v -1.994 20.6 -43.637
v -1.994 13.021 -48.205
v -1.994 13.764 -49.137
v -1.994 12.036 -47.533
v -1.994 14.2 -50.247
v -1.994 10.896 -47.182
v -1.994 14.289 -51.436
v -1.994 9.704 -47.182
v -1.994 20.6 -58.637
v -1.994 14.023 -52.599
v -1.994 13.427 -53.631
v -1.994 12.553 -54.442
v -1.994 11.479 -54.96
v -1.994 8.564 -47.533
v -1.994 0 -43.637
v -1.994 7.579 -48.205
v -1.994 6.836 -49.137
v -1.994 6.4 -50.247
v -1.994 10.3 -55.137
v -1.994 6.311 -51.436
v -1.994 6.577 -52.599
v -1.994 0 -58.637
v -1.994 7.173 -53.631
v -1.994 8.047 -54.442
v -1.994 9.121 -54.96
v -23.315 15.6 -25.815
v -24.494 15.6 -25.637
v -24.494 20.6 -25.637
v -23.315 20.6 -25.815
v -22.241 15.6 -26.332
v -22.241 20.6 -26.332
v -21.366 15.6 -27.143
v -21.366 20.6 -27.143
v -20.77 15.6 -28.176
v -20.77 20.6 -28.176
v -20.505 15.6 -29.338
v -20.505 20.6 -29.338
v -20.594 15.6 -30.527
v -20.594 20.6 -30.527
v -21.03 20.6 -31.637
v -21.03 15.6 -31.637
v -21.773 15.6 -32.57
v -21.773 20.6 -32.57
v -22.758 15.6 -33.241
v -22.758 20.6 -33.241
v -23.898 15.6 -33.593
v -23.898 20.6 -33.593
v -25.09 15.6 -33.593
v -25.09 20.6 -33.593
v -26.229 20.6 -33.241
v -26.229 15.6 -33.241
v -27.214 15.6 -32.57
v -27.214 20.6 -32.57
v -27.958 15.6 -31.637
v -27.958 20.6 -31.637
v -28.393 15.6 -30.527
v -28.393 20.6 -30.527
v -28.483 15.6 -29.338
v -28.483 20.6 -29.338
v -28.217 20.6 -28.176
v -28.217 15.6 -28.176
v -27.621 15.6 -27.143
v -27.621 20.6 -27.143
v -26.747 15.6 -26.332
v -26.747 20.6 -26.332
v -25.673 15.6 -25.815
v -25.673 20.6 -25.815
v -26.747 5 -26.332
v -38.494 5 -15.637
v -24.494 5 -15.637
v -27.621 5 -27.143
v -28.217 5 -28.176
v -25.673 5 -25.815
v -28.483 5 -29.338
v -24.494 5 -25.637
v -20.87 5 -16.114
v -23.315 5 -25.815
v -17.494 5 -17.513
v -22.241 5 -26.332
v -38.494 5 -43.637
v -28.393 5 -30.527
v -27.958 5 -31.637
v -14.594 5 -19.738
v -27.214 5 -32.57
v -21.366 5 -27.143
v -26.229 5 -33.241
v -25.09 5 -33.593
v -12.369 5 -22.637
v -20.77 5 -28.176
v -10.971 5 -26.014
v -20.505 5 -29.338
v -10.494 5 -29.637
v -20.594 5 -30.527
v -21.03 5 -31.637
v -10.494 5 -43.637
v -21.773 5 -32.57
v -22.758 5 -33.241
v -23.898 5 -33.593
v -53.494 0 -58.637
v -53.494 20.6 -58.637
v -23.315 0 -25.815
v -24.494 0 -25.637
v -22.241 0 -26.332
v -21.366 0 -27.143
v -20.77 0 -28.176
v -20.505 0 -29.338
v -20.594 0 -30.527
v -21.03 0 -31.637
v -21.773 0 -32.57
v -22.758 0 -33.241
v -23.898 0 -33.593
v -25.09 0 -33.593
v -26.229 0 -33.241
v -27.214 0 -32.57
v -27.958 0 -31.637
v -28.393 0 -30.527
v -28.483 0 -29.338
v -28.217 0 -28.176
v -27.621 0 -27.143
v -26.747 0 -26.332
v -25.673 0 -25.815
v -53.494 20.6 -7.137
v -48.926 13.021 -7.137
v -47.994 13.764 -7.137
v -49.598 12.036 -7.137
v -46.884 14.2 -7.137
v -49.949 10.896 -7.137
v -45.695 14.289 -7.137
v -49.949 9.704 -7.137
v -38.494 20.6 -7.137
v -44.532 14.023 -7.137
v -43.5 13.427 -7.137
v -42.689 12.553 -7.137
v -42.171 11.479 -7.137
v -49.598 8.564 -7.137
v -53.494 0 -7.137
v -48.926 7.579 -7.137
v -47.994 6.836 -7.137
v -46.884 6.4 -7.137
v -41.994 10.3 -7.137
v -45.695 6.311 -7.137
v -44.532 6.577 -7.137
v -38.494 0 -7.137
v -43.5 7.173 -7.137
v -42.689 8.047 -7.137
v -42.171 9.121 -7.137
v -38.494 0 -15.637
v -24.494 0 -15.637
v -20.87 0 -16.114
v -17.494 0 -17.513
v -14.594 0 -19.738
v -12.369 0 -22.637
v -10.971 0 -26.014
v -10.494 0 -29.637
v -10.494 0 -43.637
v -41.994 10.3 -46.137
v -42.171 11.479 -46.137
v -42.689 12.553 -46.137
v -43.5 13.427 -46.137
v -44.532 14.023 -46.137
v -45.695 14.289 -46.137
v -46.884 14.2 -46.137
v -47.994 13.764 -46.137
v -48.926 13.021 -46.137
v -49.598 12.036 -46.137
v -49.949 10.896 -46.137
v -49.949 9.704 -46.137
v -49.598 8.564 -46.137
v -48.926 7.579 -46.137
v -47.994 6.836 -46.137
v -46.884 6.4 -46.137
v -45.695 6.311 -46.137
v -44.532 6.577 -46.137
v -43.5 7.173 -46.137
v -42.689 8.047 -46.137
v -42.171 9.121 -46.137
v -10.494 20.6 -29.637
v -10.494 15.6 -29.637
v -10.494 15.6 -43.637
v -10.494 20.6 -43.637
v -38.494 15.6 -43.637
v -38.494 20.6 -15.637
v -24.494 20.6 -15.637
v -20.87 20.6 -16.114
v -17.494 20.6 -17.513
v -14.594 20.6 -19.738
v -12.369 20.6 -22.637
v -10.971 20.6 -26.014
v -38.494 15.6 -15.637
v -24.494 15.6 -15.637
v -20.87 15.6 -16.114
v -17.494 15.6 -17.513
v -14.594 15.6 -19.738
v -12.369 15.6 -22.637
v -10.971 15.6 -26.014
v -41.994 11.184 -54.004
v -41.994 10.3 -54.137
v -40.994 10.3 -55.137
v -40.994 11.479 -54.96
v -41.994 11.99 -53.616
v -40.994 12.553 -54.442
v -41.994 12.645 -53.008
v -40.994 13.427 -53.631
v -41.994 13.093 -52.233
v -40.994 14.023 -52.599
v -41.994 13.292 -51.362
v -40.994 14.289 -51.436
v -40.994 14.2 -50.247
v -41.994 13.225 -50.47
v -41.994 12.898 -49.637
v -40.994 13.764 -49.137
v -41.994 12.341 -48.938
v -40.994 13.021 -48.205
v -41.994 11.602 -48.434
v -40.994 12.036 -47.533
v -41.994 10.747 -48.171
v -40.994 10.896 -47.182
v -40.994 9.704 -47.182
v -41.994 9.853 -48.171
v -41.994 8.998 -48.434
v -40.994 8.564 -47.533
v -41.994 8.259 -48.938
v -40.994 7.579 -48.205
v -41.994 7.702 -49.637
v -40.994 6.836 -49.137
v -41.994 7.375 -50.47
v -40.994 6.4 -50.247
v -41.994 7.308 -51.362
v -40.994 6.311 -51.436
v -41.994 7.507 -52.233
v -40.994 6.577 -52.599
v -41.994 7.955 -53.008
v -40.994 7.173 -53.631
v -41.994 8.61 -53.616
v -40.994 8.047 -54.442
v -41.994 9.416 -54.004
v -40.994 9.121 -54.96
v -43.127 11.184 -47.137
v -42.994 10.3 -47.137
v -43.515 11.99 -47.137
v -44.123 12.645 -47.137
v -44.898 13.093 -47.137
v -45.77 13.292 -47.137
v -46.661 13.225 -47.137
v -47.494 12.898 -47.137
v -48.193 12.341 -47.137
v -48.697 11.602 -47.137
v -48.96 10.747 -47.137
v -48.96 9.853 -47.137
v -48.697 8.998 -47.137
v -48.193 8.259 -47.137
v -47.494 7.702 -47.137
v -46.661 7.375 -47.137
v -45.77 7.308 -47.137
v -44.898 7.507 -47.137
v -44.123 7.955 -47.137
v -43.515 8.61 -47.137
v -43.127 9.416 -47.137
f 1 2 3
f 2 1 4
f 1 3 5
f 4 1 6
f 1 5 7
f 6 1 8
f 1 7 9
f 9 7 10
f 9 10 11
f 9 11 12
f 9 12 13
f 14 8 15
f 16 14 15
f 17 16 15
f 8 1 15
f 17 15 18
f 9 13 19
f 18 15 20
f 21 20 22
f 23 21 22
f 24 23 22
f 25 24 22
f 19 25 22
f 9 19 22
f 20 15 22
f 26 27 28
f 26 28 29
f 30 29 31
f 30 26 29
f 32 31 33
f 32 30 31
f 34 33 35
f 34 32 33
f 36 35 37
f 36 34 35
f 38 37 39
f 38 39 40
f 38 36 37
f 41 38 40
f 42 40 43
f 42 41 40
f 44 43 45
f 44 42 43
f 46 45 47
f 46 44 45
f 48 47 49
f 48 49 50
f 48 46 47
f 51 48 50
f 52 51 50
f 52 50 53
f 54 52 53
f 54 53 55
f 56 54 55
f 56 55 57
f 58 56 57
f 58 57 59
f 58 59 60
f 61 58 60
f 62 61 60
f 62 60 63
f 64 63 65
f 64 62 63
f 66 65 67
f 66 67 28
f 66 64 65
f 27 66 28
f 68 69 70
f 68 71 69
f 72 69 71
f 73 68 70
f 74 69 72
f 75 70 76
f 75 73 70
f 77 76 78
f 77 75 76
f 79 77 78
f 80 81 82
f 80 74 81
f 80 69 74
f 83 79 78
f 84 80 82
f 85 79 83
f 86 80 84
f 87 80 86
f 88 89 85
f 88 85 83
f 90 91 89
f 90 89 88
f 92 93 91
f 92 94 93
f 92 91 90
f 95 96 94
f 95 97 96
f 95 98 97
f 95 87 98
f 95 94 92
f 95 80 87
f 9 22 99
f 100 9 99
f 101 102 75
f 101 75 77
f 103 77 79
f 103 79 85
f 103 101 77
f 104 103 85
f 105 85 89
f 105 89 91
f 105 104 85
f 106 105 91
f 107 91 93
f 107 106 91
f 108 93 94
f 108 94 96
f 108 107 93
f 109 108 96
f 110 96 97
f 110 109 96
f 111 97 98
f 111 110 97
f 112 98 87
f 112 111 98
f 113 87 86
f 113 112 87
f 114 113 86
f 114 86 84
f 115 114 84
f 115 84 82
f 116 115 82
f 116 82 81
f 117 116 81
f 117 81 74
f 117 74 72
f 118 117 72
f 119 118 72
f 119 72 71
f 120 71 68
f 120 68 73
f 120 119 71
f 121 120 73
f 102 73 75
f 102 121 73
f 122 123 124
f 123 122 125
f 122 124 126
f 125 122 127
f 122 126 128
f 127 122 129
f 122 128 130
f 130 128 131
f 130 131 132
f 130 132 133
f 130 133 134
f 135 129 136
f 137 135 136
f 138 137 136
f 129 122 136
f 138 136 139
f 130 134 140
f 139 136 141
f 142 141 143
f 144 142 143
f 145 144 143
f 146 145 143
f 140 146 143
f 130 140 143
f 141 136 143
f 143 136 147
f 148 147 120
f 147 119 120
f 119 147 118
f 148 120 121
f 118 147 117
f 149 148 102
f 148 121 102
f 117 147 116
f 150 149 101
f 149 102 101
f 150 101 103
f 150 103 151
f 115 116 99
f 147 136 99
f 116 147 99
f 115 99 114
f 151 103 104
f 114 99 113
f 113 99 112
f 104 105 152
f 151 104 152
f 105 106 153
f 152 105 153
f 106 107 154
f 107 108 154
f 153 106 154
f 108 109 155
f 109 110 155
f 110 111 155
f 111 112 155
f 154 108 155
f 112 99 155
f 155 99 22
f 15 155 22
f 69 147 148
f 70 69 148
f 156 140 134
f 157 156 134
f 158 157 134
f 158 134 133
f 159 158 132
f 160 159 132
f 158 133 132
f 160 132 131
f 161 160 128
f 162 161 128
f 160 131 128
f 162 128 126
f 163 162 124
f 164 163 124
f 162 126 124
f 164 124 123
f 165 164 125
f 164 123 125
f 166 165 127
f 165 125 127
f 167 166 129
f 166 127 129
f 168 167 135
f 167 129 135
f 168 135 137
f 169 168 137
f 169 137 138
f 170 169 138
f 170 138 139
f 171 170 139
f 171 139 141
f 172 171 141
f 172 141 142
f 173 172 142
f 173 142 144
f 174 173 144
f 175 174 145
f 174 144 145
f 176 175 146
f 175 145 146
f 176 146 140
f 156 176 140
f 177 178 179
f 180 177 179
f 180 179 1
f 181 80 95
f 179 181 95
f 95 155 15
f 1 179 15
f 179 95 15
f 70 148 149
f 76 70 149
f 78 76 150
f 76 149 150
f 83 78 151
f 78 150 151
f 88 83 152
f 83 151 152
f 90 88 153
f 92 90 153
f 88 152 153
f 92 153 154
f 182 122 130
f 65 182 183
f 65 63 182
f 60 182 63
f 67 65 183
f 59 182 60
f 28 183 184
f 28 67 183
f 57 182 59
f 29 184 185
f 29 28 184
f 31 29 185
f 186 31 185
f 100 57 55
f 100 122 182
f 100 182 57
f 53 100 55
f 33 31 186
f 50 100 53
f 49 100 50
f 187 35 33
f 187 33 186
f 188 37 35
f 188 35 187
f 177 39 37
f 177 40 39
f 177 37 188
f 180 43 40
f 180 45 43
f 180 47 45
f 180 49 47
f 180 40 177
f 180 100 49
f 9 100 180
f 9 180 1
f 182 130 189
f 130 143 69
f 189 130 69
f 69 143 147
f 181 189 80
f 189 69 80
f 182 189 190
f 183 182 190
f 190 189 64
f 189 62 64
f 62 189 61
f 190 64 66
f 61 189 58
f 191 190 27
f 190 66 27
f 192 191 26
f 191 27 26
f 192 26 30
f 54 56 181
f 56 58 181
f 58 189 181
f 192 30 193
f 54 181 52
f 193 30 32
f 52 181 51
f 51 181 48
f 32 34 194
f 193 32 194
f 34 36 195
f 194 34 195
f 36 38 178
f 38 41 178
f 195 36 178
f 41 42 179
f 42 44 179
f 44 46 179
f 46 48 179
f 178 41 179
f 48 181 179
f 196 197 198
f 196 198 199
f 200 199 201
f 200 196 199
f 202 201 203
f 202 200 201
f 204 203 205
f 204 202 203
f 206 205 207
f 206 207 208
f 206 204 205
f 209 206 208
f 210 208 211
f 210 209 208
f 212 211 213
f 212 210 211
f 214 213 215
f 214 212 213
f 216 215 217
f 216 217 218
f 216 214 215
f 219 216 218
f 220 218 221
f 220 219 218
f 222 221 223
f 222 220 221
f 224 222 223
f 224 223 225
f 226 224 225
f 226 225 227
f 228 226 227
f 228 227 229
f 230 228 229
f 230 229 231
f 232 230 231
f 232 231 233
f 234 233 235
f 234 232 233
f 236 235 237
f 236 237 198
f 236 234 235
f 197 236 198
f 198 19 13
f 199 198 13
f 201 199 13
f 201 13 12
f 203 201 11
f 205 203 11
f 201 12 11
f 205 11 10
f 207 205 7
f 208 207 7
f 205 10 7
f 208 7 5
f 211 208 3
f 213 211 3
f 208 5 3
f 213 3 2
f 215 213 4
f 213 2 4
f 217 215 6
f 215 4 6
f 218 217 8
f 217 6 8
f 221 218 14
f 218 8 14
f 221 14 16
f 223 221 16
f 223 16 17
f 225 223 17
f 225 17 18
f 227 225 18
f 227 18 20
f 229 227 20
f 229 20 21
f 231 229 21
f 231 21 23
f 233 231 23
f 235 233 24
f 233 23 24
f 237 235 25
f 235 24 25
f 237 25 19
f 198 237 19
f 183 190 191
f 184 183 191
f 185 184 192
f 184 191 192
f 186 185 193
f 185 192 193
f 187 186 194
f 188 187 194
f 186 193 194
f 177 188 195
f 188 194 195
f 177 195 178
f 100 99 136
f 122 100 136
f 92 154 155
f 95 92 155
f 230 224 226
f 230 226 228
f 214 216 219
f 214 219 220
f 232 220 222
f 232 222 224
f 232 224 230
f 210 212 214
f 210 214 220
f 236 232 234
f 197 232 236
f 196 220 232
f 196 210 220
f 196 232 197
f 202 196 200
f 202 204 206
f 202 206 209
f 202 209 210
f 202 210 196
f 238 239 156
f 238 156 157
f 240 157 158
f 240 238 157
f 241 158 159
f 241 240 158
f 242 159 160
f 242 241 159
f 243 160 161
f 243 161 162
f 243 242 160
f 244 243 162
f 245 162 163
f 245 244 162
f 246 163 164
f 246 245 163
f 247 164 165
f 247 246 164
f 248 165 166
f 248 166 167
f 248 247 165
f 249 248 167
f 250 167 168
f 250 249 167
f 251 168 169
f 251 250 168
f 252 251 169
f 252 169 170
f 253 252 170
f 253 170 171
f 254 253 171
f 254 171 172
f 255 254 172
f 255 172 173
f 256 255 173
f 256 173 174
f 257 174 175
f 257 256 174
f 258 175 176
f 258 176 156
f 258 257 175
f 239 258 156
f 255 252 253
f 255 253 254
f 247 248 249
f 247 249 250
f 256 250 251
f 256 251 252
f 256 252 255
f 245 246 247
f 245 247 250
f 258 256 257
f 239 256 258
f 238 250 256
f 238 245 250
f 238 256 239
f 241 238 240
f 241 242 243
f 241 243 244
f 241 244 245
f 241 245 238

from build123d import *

# Parameters (mm, degrees)
SKETCH1_W           = 8
SKETCH1_H           = 40
SKETCH1_W_2         = 40
SKETCH1_H_2         = 8
BOSS_EXTRUDE1_DEPTH = 20.6
SKETCH1_3_R         = 4
BOSS_EXTRUDE2_DEPTH = 5
BOSS_EXTRUDE4_START = 15.6
SKETCH1_4_R         = 4
BOSS_EXTRUDE4_DEPTH = 5
SKETCH2_R           = 4
CUT_EXTRUDE1_DEPTH  = 40
CHAMFER1_SIZE       = 1
SKETCH5_R           = 4
CUT_EXTRUDE7_DEPTH  = 40
CHAMFER2_SIZE       = 1


with BuildPart() as part:
    # Sketch1 → Boss-Extrude1 (new body)
    with BuildSketch(Plane(origin=(0, 0, 0), x_dir=(1, 0, 0), z_dir=(0, 1, 0))):
        Polygon((-49.993785762, 7.13734227), (-49.993785762, 47.13734227), (-41.993785762, 47.13734227), (-41.993785762, 55.13734227), (-1.993785762, 55.13734227), (-1.993785762, 58.63734227), (-53.493785762, 58.63734227), (-53.493785762, 7.13734227), align=None)
        with Locations((-45.993785762, 27.13734227)):
            Rectangle(SKETCH1_W, SKETCH1_H)
        Polygon((-1.993785762, 47.13734227), (-41.993785762, 47.13734227), (-41.993785762, 7.13734227), (-38.493785762, 7.13734227), (-38.493785762, 15.63734227), (-38.493785762, 43.63734227), (-10.493785762, 43.63734227), (-1.993785762, 43.63734227), align=None)
        with Locations((-21.993785762, 51.13734227)):
            Rectangle(SKETCH1_W_2, SKETCH1_H_2)
    extrude(amount=BOSS_EXTRUDE1_DEPTH)

    # Sketch1<3> → Boss-Extrude2 (add)
    with BuildSketch(Plane(origin=(0, 0, 0), x_dir=(1, 0, 0), z_dir=(0, 1, 0))):
        with BuildLine():
            Line((-38.493785762, 43.63734227), (-38.493785762, 15.63734227))
            Line((-38.493785762, 15.63734227), (-24.493785762, 15.63734227))
            ThreePointArc((-24.493785762, 15.63734227), (-14.594290825, 19.737847333), (-10.493785762, 29.63734227))
            Line((-10.493785762, 29.63734227), (-10.493785762, 43.63734227))
            Line((-10.493785762, 43.63734227), (-38.493785762, 43.63734227))
        make_face()
        with Locations(Location((-24.493785762, 29.63734227, 0), (0, 0, 270))):
            Circle(SKETCH1_3_R, mode=Mode.SUBTRACT)
    extrude(amount=BOSS_EXTRUDE2_DEPTH)

    # Sketch1<4> → Boss-Extrude4 (add)
    with BuildSketch(Plane(origin=(0, 0, 0), x_dir=(1, 0, 0), z_dir=(0, 1, 0)).offset(BOSS_EXTRUDE4_START)):
        with BuildLine():
            Line((-38.493785762, 43.63734227), (-38.493785762, 15.63734227))
            Line((-38.493785762, 15.63734227), (-24.493785762, 15.63734227))
            ThreePointArc((-24.493785762, 15.63734227), (-14.594290825, 19.737847333), (-10.493785762, 29.63734227))
            Line((-10.493785762, 29.63734227), (-10.493785762, 43.63734227))
            Line((-10.493785762, 43.63734227), (-38.493785762, 43.63734227))
        make_face()
        with Locations(Location((-24.493785762, 29.63734227, 0), (0, 0, 270))):
            Circle(SKETCH1_4_R, mode=Mode.SUBTRACT)
    extrude(amount=BOSS_EXTRUDE4_DEPTH)

    # Sketch2 → Cut-Extrude1 (cut)
    with BuildSketch(Plane.XY.offset(-7.13734227)):
        with Locations((-45.993785762, 10.3)):
            Circle(SKETCH2_R)
    extrude(amount=-CUT_EXTRUDE1_DEPTH, mode=Mode.SUBTRACT)

    # Chamfer1
    chamfer1_edges = [part.edges().sort_by_distance(p)[0] for p in [
        (-49.993785762, 10.3, -47.13734227),
    ]]
    chamfer(chamfer1_edges, length=CHAMFER1_SIZE)

    # Sketch5 → Cut-Extrude7 (cut)
    with BuildSketch(Plane(origin=(-1.993785762, 0, 0), x_dir=(0, 0, -1), z_dir=(1, 0, 0))):
        with Locations((51.13734227, 10.3)):
            Circle(SKETCH5_R)
    extrude(amount=-CUT_EXTRUDE7_DEPTH, mode=Mode.SUBTRACT)

    # Chamfer2
    chamfer2_edges = [part.edges().sort_by_distance(p)[0] for p in [
        (-41.993785762, 10.3, -47.13734227),
    ]]
    chamfer(chamfer2_edges, length=CHAMFER2_SIZE)


solid = part.part
